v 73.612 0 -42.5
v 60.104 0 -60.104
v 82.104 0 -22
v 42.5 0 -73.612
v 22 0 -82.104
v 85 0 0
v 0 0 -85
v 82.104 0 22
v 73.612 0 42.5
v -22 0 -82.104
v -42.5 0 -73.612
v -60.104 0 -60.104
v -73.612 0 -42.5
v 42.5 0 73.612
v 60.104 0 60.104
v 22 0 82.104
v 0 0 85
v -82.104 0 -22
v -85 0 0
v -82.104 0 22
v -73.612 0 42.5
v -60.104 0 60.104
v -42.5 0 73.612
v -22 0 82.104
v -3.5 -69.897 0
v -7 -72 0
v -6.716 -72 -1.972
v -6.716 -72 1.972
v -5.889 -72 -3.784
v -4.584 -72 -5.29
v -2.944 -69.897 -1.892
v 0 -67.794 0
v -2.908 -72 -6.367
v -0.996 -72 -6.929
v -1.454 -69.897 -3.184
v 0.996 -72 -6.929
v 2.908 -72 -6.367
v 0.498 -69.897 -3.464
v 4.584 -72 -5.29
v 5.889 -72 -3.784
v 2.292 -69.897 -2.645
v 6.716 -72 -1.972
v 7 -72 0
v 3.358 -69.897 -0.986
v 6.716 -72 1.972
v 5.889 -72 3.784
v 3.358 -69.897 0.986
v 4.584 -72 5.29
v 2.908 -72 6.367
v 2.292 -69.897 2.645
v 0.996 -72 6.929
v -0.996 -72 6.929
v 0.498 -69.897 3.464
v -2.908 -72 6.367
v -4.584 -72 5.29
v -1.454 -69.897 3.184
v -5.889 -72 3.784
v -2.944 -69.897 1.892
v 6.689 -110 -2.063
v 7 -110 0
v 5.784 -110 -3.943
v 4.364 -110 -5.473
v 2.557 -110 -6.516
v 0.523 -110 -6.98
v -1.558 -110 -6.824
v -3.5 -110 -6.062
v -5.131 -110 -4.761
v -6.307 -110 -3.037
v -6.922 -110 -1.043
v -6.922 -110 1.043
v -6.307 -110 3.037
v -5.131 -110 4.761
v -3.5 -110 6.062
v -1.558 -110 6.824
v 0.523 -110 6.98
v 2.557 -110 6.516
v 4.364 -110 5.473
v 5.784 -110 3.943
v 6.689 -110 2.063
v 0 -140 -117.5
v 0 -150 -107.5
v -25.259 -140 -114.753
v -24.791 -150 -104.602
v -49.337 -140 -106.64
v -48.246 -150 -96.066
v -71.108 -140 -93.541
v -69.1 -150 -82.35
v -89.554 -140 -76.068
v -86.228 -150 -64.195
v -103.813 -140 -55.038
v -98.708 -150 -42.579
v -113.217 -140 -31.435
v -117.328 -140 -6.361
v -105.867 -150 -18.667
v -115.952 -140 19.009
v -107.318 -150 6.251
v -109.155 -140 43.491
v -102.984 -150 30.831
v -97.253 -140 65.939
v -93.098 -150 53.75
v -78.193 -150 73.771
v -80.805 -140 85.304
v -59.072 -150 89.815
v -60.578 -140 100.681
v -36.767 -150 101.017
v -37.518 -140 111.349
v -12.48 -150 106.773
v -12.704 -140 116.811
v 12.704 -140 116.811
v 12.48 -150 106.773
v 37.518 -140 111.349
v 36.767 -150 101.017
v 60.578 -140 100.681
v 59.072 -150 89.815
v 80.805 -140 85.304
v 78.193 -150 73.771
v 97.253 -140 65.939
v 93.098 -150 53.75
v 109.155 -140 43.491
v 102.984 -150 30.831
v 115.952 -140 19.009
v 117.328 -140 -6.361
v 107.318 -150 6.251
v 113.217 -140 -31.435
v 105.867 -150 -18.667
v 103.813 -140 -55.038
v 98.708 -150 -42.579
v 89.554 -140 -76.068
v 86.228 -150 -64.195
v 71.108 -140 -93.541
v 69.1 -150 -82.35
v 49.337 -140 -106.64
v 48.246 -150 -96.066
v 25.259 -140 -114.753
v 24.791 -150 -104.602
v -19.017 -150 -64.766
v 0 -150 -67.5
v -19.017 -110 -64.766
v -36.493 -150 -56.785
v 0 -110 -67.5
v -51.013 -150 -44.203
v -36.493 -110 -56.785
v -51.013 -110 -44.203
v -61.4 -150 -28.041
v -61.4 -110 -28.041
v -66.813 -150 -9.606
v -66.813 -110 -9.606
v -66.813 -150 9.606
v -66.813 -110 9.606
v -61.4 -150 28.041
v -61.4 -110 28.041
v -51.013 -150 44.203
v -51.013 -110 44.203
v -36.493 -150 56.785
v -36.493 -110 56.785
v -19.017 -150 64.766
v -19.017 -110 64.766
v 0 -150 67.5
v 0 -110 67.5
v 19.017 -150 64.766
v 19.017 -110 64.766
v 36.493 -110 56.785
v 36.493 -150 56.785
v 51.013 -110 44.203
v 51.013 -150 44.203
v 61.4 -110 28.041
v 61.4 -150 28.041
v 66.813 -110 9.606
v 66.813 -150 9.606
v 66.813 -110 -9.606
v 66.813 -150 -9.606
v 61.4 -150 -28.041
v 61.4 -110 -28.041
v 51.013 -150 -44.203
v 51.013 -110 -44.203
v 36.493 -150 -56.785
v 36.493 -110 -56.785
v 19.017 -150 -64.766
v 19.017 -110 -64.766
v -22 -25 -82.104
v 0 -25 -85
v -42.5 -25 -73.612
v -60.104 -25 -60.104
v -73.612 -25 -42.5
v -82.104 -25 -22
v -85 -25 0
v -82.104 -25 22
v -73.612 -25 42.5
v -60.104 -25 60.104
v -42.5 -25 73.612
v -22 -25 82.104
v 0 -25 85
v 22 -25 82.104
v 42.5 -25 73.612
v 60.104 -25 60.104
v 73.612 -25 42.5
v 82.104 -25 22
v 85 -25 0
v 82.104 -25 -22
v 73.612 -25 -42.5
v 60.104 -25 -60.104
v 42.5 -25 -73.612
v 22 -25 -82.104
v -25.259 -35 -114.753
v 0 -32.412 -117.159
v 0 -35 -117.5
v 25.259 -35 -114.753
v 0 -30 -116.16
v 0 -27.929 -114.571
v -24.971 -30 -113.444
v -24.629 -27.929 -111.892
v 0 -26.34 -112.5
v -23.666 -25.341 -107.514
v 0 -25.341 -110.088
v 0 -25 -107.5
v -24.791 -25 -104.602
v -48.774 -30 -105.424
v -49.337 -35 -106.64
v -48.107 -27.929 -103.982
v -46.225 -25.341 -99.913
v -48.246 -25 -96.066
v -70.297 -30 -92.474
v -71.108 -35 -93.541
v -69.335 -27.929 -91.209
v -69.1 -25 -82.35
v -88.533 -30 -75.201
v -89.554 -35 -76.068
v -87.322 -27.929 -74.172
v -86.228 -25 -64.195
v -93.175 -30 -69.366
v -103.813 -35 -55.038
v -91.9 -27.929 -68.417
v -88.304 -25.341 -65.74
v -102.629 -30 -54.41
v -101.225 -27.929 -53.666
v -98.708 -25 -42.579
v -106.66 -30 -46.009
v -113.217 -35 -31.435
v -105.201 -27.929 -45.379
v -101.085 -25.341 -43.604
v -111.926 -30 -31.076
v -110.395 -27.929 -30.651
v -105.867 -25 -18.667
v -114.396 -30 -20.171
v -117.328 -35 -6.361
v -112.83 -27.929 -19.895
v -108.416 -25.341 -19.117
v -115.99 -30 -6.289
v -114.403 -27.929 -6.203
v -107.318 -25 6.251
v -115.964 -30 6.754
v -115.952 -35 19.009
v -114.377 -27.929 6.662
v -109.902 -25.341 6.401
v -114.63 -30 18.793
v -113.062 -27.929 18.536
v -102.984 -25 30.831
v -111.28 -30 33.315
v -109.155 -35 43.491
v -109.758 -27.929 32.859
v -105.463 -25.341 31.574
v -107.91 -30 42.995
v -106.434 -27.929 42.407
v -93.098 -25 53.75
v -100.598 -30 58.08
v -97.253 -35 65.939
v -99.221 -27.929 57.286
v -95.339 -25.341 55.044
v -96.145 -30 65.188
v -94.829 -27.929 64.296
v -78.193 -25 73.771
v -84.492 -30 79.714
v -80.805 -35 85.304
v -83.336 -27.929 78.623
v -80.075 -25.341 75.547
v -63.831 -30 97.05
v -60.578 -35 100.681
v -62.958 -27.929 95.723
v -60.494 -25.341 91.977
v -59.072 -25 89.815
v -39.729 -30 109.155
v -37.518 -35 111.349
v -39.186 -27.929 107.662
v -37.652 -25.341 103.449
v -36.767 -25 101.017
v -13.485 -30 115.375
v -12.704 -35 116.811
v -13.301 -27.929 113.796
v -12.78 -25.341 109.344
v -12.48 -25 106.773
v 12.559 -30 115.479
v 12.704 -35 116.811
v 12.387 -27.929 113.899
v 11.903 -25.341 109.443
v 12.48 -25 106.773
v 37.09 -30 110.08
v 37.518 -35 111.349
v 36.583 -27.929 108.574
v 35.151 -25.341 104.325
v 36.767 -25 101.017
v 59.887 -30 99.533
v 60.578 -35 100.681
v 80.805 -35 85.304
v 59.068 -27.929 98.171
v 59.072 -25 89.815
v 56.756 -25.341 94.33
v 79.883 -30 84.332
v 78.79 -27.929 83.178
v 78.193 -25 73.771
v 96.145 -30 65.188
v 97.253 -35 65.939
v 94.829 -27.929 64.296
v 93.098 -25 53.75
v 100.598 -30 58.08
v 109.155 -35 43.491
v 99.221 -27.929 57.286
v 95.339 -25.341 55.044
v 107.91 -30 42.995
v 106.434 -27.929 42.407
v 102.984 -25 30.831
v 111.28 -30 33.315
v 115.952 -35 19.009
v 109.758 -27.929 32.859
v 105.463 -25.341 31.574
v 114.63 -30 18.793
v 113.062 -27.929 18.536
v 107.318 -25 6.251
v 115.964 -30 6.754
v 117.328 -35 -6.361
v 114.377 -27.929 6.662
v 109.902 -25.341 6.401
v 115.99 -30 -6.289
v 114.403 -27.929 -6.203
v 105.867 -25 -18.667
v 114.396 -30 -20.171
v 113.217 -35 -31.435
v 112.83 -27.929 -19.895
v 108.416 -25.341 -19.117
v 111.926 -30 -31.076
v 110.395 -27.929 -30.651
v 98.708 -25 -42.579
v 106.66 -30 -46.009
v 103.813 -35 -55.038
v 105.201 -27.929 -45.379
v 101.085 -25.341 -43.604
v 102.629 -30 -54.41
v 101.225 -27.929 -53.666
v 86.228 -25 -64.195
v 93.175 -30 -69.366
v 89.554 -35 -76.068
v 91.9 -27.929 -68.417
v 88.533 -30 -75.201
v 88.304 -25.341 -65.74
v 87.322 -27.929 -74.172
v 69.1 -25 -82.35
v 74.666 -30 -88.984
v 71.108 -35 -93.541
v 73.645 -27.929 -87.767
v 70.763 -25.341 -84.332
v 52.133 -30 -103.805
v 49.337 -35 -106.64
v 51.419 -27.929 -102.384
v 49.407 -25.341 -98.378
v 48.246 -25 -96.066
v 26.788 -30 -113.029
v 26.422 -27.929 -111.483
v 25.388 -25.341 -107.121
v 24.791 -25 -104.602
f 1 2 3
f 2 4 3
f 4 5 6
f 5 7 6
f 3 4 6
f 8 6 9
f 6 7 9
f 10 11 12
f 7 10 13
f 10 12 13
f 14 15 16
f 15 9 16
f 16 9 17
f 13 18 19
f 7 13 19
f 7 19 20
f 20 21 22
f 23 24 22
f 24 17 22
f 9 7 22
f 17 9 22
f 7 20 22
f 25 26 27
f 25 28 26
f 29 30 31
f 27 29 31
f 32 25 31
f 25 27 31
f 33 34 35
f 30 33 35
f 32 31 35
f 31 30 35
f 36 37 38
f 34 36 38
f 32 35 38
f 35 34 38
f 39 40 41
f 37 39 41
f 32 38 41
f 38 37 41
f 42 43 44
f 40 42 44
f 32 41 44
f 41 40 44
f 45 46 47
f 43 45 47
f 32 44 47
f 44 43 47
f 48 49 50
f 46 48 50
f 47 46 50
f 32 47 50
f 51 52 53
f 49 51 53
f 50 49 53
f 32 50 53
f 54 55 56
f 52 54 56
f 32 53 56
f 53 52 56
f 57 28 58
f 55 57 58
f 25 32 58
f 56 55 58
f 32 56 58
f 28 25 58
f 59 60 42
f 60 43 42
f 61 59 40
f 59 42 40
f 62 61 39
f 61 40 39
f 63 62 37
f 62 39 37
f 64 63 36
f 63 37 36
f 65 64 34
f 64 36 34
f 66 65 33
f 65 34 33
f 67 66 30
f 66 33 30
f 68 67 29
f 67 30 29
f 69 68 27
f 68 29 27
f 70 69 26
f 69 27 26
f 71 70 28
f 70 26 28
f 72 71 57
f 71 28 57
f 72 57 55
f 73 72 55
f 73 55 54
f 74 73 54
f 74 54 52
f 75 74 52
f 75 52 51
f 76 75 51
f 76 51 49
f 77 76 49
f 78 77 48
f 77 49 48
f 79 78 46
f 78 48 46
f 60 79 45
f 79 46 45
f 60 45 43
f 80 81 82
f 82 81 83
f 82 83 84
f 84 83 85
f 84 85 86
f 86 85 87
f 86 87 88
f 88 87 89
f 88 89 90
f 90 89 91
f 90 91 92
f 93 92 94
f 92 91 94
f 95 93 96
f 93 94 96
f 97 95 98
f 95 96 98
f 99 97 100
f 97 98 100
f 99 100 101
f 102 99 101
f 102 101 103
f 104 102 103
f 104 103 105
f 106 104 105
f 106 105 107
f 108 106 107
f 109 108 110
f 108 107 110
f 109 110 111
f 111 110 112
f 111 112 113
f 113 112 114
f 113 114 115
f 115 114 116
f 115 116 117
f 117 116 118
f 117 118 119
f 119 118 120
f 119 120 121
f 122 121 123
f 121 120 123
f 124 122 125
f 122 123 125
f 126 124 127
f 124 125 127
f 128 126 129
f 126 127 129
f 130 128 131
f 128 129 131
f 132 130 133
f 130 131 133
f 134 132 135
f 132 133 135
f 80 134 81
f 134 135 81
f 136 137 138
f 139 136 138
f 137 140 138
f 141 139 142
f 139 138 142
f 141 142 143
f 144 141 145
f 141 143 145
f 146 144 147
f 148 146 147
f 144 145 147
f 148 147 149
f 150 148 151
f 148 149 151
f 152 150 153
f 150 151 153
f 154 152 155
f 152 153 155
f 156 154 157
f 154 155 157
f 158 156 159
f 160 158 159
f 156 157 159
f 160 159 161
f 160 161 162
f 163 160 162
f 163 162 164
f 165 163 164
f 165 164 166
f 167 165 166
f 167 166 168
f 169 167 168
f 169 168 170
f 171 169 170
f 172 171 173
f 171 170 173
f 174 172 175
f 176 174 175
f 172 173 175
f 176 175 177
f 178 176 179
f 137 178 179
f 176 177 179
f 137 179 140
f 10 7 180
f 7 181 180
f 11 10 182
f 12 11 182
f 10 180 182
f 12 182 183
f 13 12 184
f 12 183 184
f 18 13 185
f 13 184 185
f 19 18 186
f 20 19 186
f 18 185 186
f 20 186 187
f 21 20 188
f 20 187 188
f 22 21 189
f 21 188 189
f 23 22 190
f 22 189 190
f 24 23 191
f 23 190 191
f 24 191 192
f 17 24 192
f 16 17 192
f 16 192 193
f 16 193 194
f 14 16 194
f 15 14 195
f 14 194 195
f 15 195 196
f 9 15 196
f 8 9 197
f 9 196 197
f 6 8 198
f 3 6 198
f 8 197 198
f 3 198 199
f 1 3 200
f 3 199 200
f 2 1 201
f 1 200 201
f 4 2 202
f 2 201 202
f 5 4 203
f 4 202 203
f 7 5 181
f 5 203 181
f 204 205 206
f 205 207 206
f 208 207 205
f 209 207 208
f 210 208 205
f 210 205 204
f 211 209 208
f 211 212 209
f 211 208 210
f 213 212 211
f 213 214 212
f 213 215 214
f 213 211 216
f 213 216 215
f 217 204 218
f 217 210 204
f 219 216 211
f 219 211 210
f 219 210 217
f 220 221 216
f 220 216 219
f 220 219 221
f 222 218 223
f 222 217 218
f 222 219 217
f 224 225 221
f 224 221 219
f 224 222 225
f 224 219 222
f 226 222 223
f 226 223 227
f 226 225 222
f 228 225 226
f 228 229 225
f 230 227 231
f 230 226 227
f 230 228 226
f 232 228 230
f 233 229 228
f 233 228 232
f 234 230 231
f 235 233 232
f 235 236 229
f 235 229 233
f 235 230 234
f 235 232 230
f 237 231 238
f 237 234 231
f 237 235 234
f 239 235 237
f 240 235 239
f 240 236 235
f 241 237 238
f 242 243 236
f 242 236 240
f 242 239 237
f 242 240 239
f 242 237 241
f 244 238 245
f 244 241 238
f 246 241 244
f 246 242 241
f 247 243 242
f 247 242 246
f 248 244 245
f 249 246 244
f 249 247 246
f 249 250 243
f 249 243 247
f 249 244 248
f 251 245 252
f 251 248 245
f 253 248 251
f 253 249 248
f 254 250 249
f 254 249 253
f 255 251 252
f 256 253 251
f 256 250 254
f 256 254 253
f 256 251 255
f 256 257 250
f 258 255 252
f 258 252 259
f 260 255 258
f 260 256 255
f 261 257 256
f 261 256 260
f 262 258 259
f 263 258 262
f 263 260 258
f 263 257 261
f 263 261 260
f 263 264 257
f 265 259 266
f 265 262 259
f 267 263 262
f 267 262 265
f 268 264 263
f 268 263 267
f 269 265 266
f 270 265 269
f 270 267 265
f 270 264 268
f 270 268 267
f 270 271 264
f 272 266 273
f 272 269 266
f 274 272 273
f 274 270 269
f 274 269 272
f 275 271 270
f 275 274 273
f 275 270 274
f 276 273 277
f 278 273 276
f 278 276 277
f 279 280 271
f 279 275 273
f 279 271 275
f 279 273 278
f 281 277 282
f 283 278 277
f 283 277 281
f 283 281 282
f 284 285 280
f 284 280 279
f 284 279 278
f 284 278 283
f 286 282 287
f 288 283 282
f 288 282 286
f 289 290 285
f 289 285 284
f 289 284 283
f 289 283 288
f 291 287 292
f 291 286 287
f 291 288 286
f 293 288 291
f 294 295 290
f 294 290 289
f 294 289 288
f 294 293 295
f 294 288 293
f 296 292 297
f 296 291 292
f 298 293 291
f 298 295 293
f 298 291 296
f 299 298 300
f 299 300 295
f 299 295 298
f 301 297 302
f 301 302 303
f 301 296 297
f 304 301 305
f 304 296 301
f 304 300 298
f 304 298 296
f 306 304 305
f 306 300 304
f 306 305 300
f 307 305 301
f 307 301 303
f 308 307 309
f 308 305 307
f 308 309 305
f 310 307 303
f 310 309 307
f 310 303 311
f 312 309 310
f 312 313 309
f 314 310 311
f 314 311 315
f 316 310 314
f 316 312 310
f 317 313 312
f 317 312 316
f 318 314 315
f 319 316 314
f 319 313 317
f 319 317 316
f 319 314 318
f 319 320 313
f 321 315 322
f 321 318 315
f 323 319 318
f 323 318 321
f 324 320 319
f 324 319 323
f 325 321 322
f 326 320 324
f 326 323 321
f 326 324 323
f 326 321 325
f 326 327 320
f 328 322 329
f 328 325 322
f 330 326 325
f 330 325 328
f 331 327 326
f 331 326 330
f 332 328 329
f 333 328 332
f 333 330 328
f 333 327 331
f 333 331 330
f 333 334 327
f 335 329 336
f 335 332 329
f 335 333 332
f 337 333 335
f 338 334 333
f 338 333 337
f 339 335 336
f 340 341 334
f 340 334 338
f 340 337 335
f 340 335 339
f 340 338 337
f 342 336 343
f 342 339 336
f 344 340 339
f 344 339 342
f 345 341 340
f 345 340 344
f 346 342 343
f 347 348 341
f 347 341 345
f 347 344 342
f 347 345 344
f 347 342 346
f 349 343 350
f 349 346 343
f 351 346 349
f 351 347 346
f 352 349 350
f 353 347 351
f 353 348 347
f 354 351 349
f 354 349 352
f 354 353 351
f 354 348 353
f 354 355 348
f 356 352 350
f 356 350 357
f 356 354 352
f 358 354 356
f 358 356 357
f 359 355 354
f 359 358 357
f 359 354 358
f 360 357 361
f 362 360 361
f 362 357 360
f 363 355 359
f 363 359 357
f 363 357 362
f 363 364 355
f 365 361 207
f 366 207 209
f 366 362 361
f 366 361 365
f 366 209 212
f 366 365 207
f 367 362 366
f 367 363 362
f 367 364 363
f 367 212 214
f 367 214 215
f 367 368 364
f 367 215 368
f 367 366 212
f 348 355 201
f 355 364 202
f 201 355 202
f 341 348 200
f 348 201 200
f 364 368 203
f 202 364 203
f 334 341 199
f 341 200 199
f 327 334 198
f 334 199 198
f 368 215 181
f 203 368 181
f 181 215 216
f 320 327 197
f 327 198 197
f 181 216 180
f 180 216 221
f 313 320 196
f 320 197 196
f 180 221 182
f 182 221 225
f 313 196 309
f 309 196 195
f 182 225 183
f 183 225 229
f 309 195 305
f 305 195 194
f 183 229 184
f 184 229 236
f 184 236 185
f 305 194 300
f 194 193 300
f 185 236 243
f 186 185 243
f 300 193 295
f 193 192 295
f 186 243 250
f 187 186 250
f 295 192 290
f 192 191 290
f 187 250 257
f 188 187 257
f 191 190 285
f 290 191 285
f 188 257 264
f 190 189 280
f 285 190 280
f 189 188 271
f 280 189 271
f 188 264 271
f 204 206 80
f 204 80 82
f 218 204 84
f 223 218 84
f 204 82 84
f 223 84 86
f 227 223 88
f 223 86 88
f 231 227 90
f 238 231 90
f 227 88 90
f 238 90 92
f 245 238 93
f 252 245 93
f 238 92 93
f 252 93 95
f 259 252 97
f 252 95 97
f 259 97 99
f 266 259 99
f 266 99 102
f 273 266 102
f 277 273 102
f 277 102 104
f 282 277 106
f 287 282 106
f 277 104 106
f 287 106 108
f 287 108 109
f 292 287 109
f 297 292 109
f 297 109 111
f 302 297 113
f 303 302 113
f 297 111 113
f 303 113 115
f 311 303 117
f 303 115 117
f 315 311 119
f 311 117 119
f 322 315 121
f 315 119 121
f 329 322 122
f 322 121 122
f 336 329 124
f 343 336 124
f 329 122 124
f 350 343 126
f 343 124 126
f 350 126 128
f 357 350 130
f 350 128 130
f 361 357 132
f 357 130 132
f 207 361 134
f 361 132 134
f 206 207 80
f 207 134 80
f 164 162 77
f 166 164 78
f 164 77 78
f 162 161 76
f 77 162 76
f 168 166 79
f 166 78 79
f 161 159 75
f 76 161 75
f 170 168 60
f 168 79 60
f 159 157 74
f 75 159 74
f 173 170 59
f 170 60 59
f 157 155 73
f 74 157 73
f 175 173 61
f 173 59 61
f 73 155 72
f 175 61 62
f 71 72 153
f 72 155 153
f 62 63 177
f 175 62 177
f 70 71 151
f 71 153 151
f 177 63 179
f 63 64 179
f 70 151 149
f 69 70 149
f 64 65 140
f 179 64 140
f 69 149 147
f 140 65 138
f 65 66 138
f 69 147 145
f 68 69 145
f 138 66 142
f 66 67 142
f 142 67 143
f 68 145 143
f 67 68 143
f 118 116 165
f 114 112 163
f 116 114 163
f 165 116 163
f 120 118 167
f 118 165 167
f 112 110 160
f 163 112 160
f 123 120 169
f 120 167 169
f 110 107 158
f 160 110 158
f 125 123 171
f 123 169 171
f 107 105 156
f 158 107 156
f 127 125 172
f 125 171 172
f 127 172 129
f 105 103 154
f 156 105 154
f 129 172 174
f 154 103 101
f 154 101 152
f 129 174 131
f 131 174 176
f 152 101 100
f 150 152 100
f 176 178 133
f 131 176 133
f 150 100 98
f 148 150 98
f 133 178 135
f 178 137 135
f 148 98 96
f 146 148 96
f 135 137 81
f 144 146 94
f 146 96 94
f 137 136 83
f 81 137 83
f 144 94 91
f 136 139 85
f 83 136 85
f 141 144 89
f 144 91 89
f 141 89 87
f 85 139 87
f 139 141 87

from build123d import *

# Parameters (mm, degrees)
HOLE_WIZARD_M16_1_D     = 14
HOLE_WIZARD_M16_1_DEPTH = 38
HOLE_WIZARD_M16_1_TIP   = 4.206024333
CHAMFER_1_SIZE          = 10
FILLET_1_R              = 10


with BuildPart() as part:
    # 草图1 → 旋转1 (revolve)
    with BuildSketch(Plane.XY, mode=Mode.PRIVATE) as revolve_1_sk:
        Polygon((0, 0), (85, 0), (85, -25), (117.5, -25), (117.5, -150), (67.5, -150), (67.5, -110), (0, -110), align=None)
    revolve(revolve_1_sk.sketch.rotate(Axis((0, 0, 0), (0, 1, 0)), 90), axis=Axis((0, 0, 0), (0, 1, 0)))

    # M16 螺纹孔1
    with Locations(Plane(origin=(0, -110, 0), x_dir=(-1, 0, 0), z_dir=(0, -1, 0))):
        with Locations((0, 0)):
            Hole(HOLE_WIZARD_M16_1_D / 2, depth=HOLE_WIZARD_M16_1_DEPTH)
            with Locations((0, 0, -(HOLE_WIZARD_M16_1_DEPTH + HOLE_WIZARD_M16_1_TIP / 2))):  # 118° drill point
                Cone(0, HOLE_WIZARD_M16_1_D / 2, HOLE_WIZARD_M16_1_TIP, mode=Mode.SUBTRACT)

    # 倒角1
    chamfer_1_edges = [part.edges().sort_by_distance(p)[0] for p in [
        (0, -150, 117.5),
    ]]
    chamfer(chamfer_1_edges, length=CHAMFER_1_SIZE)

    # 圆角1
    fillet_1_edges = [part.edges().sort_by_distance(p)[0] for p in [
        (0, -25, 117.5),
    ]]
    fillet(fillet_1_edges, radius=FILLET_1_R)


solid = part.part
